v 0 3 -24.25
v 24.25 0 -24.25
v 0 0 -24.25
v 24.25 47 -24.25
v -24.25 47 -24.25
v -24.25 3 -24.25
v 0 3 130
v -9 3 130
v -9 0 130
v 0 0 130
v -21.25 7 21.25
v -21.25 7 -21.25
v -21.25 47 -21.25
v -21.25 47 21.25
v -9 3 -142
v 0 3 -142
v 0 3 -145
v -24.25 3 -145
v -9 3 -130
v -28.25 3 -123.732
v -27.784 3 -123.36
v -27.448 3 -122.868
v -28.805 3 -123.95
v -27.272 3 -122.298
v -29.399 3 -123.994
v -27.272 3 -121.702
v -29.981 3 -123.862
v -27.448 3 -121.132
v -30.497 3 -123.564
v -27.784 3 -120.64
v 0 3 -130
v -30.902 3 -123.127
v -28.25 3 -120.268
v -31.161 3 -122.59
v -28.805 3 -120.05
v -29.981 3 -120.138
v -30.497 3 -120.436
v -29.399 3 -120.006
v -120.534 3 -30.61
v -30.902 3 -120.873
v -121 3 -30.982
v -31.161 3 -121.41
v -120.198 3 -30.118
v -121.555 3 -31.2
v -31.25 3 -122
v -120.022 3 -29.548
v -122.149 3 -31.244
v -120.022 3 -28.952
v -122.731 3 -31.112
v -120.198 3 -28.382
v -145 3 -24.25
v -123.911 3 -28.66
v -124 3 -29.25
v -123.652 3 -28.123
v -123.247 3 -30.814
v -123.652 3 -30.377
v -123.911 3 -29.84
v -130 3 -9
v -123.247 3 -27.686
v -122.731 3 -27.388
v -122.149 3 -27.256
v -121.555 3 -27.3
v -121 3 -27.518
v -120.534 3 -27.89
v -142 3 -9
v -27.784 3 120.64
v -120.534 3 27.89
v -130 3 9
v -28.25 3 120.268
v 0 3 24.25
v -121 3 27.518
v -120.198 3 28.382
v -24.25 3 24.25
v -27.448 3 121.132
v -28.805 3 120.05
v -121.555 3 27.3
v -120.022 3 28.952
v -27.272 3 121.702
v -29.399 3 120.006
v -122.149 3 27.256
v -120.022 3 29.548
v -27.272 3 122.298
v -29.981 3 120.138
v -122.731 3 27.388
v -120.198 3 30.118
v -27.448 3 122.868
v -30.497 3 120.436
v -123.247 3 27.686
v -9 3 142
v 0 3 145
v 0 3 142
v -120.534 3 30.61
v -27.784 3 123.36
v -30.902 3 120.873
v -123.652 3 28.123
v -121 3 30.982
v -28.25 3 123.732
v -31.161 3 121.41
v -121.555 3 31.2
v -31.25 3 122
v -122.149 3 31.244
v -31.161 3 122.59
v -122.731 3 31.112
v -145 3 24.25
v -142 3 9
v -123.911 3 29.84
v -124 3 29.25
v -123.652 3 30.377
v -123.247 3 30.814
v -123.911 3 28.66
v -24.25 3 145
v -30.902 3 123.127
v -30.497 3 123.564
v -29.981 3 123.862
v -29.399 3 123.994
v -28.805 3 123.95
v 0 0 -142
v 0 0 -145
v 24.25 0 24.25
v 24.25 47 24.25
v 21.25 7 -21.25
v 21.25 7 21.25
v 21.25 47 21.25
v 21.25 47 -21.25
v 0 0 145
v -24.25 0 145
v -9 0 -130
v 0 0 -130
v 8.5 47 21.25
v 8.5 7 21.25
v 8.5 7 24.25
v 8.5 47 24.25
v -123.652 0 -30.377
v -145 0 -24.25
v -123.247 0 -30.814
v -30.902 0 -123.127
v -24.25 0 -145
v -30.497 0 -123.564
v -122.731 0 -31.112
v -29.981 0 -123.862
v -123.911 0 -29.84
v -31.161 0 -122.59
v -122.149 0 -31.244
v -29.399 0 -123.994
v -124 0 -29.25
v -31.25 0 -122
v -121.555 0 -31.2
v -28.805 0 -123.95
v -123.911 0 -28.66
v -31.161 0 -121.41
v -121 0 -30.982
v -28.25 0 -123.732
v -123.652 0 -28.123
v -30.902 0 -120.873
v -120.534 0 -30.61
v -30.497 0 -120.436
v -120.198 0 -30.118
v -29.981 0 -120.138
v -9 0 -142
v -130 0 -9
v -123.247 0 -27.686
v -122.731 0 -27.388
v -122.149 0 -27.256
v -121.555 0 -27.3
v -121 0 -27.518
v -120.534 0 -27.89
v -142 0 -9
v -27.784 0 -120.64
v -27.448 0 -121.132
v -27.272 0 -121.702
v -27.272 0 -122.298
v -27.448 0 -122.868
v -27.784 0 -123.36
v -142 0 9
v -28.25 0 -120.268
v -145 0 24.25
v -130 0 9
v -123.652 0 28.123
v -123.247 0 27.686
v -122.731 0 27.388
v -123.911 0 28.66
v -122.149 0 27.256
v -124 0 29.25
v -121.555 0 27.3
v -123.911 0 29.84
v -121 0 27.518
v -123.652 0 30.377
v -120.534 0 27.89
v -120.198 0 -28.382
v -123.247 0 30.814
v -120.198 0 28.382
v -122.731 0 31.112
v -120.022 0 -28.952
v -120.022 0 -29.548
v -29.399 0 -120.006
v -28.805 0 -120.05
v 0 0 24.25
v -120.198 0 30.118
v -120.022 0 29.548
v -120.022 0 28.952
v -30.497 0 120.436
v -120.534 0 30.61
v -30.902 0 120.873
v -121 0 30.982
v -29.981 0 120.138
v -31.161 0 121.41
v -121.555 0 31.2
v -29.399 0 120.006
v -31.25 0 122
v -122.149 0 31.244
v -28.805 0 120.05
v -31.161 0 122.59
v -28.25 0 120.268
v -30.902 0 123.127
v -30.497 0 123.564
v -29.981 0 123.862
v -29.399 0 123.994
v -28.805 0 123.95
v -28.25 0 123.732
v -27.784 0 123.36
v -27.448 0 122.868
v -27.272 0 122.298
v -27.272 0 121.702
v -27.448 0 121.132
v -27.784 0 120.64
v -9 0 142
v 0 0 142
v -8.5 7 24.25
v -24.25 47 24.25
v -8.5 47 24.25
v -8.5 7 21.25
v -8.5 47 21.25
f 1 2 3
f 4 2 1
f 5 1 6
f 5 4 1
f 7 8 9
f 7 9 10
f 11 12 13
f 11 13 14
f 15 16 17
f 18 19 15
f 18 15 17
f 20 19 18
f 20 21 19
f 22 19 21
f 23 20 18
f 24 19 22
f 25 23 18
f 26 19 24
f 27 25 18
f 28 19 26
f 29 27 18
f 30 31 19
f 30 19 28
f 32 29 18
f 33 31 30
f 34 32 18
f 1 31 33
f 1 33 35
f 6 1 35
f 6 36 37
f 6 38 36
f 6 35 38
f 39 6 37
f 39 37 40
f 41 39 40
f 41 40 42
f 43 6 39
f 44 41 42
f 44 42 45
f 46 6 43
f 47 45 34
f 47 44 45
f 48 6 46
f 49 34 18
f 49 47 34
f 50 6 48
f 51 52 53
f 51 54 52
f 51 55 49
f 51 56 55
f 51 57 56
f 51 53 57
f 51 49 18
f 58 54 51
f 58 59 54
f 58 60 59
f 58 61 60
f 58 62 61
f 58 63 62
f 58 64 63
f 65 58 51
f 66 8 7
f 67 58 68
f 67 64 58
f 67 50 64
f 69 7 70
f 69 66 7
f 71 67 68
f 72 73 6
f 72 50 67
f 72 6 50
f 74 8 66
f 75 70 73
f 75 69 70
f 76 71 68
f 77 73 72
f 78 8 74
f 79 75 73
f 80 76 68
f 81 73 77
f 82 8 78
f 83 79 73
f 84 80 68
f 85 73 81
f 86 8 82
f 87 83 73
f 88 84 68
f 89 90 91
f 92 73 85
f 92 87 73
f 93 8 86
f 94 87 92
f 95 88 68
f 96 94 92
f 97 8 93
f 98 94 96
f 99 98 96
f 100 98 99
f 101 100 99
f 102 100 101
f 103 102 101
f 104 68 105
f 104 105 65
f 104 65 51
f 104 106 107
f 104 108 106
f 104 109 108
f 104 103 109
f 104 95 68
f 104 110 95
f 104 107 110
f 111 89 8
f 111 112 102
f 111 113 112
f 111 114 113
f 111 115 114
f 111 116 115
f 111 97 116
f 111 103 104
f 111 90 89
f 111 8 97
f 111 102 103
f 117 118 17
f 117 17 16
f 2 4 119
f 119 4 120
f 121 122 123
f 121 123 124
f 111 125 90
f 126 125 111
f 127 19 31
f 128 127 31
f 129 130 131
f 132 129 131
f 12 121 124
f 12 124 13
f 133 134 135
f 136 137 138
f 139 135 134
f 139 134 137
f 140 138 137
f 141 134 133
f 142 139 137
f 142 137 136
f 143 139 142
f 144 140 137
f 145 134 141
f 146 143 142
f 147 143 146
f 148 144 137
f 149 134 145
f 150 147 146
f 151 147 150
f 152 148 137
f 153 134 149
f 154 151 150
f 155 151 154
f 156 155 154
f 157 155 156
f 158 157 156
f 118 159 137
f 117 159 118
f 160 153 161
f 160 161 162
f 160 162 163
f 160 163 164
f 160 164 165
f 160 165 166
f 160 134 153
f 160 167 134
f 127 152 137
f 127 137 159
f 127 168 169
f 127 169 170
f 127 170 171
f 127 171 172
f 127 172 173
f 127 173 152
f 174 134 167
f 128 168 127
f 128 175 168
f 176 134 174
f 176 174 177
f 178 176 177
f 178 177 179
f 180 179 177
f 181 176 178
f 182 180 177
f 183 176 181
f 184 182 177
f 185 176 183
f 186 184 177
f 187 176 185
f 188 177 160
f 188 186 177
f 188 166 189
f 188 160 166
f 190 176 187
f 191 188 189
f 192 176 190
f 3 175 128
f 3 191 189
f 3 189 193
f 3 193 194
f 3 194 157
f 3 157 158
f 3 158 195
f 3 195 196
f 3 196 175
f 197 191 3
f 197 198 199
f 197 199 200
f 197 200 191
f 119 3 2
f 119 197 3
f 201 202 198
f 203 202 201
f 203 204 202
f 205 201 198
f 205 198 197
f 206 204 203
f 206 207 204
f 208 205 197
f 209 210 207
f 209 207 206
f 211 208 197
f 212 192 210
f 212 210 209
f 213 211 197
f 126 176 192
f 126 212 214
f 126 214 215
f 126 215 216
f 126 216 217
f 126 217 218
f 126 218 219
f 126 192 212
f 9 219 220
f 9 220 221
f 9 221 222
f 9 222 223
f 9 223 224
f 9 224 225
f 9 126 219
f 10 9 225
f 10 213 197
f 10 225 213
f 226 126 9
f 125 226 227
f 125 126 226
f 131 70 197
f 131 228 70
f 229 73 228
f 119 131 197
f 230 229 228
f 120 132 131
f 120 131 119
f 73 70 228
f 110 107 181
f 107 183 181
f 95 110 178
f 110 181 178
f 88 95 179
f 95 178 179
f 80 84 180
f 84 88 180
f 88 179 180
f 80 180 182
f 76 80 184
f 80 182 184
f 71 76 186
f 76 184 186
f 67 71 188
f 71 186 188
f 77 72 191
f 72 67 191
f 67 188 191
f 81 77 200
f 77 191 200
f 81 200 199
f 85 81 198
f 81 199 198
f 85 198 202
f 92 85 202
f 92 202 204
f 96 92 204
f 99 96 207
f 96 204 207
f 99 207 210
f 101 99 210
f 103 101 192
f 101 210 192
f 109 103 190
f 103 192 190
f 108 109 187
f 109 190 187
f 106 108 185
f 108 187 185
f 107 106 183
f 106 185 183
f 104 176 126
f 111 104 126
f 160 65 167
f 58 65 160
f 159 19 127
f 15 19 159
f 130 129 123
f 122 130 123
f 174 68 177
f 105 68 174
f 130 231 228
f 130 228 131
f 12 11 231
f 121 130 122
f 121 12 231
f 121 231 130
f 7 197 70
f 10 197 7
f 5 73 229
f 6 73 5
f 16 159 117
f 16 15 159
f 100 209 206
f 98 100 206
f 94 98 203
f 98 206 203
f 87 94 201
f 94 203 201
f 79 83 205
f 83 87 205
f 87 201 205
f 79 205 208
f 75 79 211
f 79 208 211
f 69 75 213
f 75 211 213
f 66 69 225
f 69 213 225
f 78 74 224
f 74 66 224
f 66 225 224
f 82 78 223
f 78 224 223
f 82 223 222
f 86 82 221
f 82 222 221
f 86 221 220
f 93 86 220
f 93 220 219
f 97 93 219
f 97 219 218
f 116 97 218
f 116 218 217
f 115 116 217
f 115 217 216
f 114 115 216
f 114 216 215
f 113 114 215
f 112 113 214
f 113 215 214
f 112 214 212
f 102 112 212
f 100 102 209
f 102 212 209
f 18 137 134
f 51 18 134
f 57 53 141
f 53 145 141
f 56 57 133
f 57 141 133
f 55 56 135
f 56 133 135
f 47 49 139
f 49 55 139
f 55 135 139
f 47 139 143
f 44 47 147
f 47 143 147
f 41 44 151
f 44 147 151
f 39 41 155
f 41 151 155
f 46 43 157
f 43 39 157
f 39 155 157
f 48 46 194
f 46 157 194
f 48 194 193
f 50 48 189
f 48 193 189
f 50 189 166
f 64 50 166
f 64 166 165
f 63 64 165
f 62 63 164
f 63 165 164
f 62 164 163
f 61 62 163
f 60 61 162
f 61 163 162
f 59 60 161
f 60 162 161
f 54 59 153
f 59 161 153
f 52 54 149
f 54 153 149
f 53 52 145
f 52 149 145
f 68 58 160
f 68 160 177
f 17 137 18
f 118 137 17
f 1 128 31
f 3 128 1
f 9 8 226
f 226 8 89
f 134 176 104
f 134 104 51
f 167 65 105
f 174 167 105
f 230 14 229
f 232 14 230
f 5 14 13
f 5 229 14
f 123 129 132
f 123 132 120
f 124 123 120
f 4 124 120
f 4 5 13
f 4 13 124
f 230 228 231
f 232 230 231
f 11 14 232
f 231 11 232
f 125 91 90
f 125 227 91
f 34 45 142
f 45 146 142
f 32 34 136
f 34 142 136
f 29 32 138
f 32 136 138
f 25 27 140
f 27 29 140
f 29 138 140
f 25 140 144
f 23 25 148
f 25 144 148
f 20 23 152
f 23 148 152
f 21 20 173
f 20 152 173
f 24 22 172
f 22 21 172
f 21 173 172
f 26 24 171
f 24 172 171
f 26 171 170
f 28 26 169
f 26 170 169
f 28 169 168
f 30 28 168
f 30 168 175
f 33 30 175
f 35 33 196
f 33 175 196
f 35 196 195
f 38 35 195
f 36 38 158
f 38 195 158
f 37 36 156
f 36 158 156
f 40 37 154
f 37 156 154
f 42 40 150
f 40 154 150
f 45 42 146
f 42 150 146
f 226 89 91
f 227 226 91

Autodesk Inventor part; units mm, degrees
ref_plane "YZ Plane" through (0, 0, 0) normal (1, 0, 0) x (0, 1, 0)
ref_plane "XZ Plane" through (0, 0, 0) normal (0, 1, 0) x (-1, 0, 0)
ref_plane "XY Plane" through (0, 0, 0) normal (0, 0, 1) x (1, 0, 0)
sketch "Boceto1" plane through (0, 0, 0) normal (0, 1, 0) x (-1, 0, 0)
  line L0 (0, 145) -> (24.25, 145)
  line L1 (145, 24.25) -> (145, -24.25)
  line L2 (145, 24.25) -> (24.25, 145)
  line L3 (24.25, -145) -> (145, -24.25)
  line L4 (24.25, -145) -> (0, -145)
  circle A0 centre (29.25, -122) radius 2
  circle A1 centre (122, -29.25) radius 2
  circle A2 centre (122, 29.25) radius 2
  circle A3 centre (29.25, 122) radius 2
  line L5 (0, -145) -> (0, 145)
  point P0 (0, 0)
  dimension "d13" = 4
  dimension "d16" = 4
  dimension "d18" = 4
  dimension "d20" = 4
extrude "Extrusión1" add sketch "Boceto1" along normal blind 3
sketch "Boceto2" plane through (0, 3, 0) normal (0, 1, 0) x (1, 0, 0)
  line L0 (21.25, -21.25) -> (21.25, 21.25)
  line L1 (21.25, 21.25) -> (-21.25, 21.25)
  line L2 (-21.25, 21.25) -> (-21.25, -21.25)
  line L3 (-24.25, 24.25) -> (24.25, 24.25)
  line L4 (24.25, 24.25) -> (24.25, -24.25)
  line L5 (-24.25, -24.25) -> (-24.25, 24.25)
  line L6 (8.5, -21.25) -> (8.5, -24.25)
  line L7 (-8.5, -24.25) -> (-8.5, -21.25)
  line L8 (-21.25, -21.25) -> (-8.5, -21.25)
  line L9 (8.5, -21.25) -> (21.25, -21.25)
  line L10 (24.25, -24.25) -> (8.5, -24.25)
  line L11 (-8.5, -24.25) -> (-24.25, -24.25)
  dimension "d29" = 42.5
  dimension "d30" = 42.5
  dimension "d31" = 48.5
  dimension "d32" = 48.5
extrude "Extrusión2" add sketch "Boceto2" along normal blind 44
sketch "Boceto3" plane through (0, 3, 0) normal (0, 1, 0) x (1, 0, 0)
  line L0 (-21.25, 21.25) -> (-21.25, -21.25) projected
  line L1 (21.25, 21.25) -> (21.25, -21.25) projected
  line L2 (-21.25, 21.25) -> (21.25, 21.25)
  line L3 (21.25, 21.25) -> (21.25, -21.25)
  line L4 (21.25, -21.25) -> (-21.25, -21.25)
  line L5 (-21.25, -21.25) -> (-21.25, 21.25)
extrude "Extrusión3" add sketch "Boceto3" along normal blind 4
sketch "Boceto5" plane through (0, 3, 0) normal (0, 1, 0) x (1, 0, 0)
  line L0 (-142, 9) -> (-130, 9)
  line L1 (-130, 9) -> (-130, -9)
  line L2 (-130, -9) -> (-142, -9)
  line L3 (-9, -130) -> (-9, -142)
  line L4 (-9, 130) -> (-9, 142)
  line L5 (-142, 9) -> (-142, -9)
  line L6 (-9, -130) -> (0, -130)
  line L7 (-9, -142) -> (0, -142)
  line L8 (0, -130) -> (0, -142)
  line L9 (0, -145) -> (0, 145) projected
  line L10 (-9, 142) -> (0, 142)
  line L11 (0, 130) -> (0, 142)
  line L12 (-9, 130) -> (0, 130)
  line L13 (-8.5, -21.25) -> (-8.5, -33.25)
  line L14 (-8.5, -33.25) -> (0, -33.25)
  line L15 (0, -21.25) -> (0, -33.25)
  dimension "d72" = 12
extrude "Extrusión5" cut sketch "Boceto5" against normal blind 3
sketch "Boceto8" plane through (0, 3, 0) normal (0, -1, 0) x (1, 0, 0)
  line L0 (24.25, -24.25) -> (-24.25, -24.25) projected
  line L1 (8.5, 24.25) -> (24.25, 24.25) projected
  line L2 (0, -24.25) -> (24.25, -24.25)
  line L3 (24.25, -24.25) -> (24.25, 24.25)
  line L4 (24.25, 24.25) -> (0, 24.25)
  line L5 (0, 24.25) -> (0, -24.25)
  point P0 (0, 0)
extrude "Extrusión8" add sketch "Boceto8" along normal blind 3
sketch "Boceto9" plane through (-8.5, 3, 21.25) normal (0, 0, 1) x (1, 0, 0)
  line L0 (0, 0) -> (0, 4) projected
  line L1 (17, 0) -> (0, 0) projected
  line L2 (0, 4) -> (17, 4)
  line L3 (17, 4) -> (17, 0)
  line L4 (17, 0) -> (0, 0)
  line L5 (0, 0) -> (0, 4)
  point P0 (8.5, -3)
extrude "Extrusión9" add sketch "Boceto9" along normal blind 3
properties part number "Base Definitiva" material "Plástico ABS"
